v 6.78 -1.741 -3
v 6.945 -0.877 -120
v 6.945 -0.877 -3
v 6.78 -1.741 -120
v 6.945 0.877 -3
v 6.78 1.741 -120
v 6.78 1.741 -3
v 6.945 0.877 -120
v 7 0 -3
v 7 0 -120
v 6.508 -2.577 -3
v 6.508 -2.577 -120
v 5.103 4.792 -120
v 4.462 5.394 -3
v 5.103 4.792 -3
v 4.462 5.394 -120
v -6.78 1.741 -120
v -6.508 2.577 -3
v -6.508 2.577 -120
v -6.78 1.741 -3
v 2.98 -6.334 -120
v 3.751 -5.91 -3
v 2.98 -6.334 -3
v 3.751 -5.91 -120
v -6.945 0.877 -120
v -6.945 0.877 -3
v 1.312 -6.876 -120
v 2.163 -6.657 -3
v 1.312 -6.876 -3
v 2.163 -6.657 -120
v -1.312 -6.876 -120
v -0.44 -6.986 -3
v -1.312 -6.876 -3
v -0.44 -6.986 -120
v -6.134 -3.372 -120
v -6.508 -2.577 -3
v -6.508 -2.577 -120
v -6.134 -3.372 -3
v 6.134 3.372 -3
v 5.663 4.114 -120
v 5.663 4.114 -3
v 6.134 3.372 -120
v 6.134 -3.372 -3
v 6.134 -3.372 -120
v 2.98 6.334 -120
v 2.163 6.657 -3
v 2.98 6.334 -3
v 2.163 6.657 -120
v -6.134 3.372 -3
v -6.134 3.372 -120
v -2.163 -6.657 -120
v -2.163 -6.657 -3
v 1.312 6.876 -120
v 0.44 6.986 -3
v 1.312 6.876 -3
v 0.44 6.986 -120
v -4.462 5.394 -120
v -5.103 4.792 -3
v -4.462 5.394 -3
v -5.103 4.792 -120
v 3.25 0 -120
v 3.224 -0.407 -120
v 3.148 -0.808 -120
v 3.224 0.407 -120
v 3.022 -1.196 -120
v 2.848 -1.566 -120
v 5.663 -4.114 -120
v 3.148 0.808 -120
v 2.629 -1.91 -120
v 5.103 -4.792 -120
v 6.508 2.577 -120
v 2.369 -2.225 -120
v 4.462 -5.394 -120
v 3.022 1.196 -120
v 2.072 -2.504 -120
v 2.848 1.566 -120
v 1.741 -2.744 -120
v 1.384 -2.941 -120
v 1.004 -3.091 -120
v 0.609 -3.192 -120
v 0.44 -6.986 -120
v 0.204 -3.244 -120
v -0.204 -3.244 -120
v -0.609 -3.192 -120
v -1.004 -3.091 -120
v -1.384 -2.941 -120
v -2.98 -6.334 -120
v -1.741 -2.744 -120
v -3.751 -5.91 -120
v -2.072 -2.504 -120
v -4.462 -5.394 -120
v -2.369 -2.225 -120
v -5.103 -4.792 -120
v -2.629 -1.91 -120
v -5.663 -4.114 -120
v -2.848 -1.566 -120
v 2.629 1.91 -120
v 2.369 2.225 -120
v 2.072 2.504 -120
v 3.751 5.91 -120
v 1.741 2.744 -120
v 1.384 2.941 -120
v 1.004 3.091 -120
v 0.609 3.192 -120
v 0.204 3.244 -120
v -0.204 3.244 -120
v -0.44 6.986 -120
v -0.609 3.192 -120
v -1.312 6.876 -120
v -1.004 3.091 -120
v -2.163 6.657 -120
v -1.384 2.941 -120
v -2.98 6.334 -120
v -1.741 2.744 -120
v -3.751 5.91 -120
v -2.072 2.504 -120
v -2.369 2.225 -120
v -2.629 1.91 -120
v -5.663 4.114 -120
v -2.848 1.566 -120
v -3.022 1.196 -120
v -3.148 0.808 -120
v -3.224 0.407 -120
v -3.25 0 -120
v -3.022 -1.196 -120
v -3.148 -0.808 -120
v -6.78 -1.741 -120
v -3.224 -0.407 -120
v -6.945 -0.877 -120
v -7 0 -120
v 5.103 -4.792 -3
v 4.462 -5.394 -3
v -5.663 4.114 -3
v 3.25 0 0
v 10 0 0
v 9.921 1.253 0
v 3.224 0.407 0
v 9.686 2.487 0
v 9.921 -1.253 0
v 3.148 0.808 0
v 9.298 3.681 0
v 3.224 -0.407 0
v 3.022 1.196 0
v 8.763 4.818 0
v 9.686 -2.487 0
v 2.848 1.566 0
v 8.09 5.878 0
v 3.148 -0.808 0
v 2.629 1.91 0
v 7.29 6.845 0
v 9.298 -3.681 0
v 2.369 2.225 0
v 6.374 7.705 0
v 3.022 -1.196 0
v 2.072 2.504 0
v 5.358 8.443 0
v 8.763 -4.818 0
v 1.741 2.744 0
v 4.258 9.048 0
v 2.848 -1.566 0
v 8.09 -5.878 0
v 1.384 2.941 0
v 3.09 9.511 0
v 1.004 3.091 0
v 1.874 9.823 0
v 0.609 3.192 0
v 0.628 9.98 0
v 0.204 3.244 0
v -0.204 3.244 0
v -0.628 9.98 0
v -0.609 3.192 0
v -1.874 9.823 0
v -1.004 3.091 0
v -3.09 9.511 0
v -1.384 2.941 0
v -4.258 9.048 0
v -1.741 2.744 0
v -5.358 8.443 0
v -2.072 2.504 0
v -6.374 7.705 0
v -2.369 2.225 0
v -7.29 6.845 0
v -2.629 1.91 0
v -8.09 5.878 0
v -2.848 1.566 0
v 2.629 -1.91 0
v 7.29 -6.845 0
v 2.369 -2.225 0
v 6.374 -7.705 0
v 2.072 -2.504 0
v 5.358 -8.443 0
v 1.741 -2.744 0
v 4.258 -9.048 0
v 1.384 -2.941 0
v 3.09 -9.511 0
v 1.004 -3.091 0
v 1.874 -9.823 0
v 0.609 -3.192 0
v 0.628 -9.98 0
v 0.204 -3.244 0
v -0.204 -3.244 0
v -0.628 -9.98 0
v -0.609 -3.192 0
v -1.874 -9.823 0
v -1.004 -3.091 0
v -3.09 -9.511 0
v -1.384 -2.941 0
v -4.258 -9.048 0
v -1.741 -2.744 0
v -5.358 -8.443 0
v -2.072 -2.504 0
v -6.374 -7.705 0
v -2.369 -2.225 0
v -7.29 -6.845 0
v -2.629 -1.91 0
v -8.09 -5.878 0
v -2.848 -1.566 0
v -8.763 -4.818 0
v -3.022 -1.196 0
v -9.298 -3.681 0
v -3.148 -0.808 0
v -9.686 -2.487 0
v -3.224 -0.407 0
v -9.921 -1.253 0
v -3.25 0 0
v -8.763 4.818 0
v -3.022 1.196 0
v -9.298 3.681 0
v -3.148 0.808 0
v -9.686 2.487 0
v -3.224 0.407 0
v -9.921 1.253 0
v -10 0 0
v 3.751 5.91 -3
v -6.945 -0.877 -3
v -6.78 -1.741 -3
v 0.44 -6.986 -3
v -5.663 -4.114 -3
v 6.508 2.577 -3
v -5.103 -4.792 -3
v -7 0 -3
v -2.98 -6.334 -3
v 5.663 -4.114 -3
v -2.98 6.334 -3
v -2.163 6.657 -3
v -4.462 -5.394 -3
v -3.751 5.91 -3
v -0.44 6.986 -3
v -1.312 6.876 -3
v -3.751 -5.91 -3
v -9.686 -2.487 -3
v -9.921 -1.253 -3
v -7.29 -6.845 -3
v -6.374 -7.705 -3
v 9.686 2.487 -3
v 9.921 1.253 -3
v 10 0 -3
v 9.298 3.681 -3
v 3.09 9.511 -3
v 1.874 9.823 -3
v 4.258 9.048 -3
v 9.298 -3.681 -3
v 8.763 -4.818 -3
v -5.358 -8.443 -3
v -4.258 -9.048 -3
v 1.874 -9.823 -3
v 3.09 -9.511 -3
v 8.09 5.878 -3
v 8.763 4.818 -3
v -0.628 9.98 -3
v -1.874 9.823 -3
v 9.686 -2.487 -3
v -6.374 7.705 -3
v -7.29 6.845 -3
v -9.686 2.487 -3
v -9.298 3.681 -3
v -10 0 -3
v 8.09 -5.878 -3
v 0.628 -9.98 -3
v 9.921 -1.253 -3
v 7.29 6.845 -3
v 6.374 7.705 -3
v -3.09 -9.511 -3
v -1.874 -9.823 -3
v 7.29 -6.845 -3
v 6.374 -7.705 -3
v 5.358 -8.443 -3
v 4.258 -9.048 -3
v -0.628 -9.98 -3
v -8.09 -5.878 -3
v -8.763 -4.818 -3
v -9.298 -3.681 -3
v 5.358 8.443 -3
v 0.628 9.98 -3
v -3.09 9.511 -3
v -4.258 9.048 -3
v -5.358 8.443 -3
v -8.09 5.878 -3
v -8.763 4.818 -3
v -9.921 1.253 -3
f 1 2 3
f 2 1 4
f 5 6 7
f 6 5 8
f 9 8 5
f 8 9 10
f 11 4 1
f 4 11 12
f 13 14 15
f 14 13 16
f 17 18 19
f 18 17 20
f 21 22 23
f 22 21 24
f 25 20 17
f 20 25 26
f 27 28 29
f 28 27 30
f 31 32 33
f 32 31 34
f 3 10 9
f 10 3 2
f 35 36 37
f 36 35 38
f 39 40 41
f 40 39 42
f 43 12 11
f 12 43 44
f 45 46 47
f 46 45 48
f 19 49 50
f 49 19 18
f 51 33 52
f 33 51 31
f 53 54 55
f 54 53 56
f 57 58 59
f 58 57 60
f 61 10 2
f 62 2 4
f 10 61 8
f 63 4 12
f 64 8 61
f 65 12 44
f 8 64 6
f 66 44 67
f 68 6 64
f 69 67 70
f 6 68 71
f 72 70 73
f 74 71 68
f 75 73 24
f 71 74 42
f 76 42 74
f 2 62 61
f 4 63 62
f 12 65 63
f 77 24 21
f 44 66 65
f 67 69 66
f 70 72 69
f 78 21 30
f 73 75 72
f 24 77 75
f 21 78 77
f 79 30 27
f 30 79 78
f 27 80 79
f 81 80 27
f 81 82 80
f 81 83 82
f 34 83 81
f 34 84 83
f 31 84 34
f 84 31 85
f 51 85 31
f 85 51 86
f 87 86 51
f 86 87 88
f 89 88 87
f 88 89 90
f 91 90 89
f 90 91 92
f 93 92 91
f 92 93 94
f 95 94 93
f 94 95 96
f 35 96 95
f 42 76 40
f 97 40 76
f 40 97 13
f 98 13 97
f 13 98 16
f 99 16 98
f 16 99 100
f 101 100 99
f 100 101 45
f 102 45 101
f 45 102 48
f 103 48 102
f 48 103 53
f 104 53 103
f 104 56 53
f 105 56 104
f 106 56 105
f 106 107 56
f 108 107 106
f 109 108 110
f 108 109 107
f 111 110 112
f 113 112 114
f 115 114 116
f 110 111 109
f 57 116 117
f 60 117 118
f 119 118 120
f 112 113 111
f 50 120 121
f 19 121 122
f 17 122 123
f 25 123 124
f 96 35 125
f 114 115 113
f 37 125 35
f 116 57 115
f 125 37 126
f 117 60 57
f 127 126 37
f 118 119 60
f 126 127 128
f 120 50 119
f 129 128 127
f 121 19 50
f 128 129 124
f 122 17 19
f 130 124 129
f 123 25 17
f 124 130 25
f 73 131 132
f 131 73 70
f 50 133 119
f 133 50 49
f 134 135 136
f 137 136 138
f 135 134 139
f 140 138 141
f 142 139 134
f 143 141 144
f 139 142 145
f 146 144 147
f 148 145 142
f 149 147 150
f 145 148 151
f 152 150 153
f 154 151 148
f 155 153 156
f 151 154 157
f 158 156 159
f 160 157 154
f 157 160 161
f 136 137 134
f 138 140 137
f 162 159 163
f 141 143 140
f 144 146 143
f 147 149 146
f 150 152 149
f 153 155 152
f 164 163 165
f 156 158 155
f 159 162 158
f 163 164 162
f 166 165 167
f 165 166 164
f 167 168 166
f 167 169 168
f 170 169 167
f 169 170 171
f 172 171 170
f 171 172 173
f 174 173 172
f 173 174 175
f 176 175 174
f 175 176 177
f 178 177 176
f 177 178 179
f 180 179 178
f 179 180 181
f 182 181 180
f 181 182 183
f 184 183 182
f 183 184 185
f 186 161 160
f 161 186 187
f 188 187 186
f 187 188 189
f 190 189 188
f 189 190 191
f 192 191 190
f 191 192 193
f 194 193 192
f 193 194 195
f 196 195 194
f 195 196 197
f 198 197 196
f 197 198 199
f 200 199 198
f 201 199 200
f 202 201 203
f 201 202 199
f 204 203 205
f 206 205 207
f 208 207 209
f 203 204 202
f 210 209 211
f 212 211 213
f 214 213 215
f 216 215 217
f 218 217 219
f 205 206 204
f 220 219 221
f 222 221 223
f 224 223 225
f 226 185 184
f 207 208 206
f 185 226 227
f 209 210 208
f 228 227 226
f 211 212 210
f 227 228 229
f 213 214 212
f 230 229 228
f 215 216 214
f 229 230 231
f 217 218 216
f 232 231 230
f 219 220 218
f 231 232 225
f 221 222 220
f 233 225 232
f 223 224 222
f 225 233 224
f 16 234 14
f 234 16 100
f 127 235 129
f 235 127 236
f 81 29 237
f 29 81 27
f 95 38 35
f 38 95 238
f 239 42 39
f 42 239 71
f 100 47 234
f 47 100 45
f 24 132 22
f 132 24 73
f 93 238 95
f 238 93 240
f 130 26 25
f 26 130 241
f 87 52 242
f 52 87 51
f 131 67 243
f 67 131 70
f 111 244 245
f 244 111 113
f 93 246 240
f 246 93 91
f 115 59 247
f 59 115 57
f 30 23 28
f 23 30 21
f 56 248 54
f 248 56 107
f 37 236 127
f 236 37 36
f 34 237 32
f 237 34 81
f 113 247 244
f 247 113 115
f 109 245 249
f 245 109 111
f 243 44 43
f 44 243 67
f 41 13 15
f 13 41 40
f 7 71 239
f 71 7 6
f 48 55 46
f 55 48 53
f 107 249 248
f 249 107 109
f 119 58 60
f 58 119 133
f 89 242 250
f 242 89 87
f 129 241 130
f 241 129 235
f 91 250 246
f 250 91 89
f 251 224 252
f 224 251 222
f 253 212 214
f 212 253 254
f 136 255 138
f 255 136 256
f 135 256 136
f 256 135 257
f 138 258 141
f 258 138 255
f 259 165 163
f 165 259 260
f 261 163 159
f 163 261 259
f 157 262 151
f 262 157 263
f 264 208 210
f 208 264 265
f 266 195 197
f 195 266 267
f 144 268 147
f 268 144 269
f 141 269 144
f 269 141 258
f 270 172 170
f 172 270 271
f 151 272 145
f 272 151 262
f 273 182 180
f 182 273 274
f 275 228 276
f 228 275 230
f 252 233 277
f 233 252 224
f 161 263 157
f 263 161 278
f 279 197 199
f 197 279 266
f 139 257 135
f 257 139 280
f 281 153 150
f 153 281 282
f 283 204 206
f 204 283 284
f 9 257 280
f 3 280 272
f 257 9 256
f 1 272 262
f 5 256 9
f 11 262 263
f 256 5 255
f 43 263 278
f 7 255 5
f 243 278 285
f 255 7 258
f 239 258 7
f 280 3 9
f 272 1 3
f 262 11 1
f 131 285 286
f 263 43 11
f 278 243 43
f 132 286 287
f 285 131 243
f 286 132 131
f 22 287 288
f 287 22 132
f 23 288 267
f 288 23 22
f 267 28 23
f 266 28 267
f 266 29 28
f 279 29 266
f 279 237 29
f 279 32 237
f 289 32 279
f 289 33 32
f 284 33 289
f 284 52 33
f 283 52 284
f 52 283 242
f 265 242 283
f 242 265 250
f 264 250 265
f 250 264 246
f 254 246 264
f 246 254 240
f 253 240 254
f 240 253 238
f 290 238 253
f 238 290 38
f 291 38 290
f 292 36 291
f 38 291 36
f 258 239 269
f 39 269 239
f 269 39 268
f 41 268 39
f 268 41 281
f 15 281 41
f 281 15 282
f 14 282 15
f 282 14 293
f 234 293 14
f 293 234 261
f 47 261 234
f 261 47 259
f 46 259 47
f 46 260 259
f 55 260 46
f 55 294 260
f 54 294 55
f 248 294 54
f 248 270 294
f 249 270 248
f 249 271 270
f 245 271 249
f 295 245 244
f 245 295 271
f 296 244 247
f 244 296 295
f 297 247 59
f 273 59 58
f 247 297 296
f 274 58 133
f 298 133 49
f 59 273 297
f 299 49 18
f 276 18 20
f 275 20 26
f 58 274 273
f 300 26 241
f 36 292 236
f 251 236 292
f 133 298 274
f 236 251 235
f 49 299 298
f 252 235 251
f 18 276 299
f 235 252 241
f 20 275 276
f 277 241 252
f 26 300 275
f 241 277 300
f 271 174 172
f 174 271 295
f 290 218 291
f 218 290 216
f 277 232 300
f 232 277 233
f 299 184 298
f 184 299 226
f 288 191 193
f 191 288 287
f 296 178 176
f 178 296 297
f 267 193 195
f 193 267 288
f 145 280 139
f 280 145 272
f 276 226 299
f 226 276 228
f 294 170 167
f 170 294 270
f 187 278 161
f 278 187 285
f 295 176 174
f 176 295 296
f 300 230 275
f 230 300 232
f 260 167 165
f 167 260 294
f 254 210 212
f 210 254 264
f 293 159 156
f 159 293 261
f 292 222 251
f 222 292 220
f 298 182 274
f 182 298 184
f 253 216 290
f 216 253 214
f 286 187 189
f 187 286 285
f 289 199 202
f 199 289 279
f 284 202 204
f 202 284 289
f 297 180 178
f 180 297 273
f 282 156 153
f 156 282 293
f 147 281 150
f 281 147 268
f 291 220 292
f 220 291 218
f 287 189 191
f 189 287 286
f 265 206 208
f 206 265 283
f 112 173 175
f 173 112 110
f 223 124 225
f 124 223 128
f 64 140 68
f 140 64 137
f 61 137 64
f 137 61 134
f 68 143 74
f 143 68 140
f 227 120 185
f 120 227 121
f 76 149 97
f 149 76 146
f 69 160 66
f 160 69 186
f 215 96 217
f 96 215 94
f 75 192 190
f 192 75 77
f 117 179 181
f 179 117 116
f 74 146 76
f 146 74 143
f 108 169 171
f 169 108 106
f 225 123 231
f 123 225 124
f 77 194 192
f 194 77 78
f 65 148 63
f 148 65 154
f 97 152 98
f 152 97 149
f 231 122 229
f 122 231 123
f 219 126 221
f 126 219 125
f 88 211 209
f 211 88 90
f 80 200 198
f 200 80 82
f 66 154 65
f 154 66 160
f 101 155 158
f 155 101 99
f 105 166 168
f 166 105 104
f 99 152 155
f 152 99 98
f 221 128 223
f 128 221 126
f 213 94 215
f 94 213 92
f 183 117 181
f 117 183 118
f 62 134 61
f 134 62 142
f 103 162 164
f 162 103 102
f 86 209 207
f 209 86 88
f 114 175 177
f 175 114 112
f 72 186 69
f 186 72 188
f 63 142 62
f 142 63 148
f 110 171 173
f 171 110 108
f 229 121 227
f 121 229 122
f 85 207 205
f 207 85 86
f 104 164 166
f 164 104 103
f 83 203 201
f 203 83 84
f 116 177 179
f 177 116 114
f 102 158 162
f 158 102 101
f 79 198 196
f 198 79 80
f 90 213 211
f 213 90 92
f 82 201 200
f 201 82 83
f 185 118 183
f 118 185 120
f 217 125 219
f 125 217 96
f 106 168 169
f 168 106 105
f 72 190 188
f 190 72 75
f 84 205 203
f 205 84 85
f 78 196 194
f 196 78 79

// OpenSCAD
$fn = 50;


difference() {
	union() {
		translate(v = [0, 0, -120.0000000000]) {
			cylinder(h = 120, r = 7.0000000000);
		}
		translate(v = [0, 0, -3.0000000000]) {
			cylinder(h = 3, r = 10.0000000000);
		}
	}
	union() {
		#translate(v = [0, 0, -120]) {
			cylinder(h = 120, r = 3.2500000000);
		}
	}
}
